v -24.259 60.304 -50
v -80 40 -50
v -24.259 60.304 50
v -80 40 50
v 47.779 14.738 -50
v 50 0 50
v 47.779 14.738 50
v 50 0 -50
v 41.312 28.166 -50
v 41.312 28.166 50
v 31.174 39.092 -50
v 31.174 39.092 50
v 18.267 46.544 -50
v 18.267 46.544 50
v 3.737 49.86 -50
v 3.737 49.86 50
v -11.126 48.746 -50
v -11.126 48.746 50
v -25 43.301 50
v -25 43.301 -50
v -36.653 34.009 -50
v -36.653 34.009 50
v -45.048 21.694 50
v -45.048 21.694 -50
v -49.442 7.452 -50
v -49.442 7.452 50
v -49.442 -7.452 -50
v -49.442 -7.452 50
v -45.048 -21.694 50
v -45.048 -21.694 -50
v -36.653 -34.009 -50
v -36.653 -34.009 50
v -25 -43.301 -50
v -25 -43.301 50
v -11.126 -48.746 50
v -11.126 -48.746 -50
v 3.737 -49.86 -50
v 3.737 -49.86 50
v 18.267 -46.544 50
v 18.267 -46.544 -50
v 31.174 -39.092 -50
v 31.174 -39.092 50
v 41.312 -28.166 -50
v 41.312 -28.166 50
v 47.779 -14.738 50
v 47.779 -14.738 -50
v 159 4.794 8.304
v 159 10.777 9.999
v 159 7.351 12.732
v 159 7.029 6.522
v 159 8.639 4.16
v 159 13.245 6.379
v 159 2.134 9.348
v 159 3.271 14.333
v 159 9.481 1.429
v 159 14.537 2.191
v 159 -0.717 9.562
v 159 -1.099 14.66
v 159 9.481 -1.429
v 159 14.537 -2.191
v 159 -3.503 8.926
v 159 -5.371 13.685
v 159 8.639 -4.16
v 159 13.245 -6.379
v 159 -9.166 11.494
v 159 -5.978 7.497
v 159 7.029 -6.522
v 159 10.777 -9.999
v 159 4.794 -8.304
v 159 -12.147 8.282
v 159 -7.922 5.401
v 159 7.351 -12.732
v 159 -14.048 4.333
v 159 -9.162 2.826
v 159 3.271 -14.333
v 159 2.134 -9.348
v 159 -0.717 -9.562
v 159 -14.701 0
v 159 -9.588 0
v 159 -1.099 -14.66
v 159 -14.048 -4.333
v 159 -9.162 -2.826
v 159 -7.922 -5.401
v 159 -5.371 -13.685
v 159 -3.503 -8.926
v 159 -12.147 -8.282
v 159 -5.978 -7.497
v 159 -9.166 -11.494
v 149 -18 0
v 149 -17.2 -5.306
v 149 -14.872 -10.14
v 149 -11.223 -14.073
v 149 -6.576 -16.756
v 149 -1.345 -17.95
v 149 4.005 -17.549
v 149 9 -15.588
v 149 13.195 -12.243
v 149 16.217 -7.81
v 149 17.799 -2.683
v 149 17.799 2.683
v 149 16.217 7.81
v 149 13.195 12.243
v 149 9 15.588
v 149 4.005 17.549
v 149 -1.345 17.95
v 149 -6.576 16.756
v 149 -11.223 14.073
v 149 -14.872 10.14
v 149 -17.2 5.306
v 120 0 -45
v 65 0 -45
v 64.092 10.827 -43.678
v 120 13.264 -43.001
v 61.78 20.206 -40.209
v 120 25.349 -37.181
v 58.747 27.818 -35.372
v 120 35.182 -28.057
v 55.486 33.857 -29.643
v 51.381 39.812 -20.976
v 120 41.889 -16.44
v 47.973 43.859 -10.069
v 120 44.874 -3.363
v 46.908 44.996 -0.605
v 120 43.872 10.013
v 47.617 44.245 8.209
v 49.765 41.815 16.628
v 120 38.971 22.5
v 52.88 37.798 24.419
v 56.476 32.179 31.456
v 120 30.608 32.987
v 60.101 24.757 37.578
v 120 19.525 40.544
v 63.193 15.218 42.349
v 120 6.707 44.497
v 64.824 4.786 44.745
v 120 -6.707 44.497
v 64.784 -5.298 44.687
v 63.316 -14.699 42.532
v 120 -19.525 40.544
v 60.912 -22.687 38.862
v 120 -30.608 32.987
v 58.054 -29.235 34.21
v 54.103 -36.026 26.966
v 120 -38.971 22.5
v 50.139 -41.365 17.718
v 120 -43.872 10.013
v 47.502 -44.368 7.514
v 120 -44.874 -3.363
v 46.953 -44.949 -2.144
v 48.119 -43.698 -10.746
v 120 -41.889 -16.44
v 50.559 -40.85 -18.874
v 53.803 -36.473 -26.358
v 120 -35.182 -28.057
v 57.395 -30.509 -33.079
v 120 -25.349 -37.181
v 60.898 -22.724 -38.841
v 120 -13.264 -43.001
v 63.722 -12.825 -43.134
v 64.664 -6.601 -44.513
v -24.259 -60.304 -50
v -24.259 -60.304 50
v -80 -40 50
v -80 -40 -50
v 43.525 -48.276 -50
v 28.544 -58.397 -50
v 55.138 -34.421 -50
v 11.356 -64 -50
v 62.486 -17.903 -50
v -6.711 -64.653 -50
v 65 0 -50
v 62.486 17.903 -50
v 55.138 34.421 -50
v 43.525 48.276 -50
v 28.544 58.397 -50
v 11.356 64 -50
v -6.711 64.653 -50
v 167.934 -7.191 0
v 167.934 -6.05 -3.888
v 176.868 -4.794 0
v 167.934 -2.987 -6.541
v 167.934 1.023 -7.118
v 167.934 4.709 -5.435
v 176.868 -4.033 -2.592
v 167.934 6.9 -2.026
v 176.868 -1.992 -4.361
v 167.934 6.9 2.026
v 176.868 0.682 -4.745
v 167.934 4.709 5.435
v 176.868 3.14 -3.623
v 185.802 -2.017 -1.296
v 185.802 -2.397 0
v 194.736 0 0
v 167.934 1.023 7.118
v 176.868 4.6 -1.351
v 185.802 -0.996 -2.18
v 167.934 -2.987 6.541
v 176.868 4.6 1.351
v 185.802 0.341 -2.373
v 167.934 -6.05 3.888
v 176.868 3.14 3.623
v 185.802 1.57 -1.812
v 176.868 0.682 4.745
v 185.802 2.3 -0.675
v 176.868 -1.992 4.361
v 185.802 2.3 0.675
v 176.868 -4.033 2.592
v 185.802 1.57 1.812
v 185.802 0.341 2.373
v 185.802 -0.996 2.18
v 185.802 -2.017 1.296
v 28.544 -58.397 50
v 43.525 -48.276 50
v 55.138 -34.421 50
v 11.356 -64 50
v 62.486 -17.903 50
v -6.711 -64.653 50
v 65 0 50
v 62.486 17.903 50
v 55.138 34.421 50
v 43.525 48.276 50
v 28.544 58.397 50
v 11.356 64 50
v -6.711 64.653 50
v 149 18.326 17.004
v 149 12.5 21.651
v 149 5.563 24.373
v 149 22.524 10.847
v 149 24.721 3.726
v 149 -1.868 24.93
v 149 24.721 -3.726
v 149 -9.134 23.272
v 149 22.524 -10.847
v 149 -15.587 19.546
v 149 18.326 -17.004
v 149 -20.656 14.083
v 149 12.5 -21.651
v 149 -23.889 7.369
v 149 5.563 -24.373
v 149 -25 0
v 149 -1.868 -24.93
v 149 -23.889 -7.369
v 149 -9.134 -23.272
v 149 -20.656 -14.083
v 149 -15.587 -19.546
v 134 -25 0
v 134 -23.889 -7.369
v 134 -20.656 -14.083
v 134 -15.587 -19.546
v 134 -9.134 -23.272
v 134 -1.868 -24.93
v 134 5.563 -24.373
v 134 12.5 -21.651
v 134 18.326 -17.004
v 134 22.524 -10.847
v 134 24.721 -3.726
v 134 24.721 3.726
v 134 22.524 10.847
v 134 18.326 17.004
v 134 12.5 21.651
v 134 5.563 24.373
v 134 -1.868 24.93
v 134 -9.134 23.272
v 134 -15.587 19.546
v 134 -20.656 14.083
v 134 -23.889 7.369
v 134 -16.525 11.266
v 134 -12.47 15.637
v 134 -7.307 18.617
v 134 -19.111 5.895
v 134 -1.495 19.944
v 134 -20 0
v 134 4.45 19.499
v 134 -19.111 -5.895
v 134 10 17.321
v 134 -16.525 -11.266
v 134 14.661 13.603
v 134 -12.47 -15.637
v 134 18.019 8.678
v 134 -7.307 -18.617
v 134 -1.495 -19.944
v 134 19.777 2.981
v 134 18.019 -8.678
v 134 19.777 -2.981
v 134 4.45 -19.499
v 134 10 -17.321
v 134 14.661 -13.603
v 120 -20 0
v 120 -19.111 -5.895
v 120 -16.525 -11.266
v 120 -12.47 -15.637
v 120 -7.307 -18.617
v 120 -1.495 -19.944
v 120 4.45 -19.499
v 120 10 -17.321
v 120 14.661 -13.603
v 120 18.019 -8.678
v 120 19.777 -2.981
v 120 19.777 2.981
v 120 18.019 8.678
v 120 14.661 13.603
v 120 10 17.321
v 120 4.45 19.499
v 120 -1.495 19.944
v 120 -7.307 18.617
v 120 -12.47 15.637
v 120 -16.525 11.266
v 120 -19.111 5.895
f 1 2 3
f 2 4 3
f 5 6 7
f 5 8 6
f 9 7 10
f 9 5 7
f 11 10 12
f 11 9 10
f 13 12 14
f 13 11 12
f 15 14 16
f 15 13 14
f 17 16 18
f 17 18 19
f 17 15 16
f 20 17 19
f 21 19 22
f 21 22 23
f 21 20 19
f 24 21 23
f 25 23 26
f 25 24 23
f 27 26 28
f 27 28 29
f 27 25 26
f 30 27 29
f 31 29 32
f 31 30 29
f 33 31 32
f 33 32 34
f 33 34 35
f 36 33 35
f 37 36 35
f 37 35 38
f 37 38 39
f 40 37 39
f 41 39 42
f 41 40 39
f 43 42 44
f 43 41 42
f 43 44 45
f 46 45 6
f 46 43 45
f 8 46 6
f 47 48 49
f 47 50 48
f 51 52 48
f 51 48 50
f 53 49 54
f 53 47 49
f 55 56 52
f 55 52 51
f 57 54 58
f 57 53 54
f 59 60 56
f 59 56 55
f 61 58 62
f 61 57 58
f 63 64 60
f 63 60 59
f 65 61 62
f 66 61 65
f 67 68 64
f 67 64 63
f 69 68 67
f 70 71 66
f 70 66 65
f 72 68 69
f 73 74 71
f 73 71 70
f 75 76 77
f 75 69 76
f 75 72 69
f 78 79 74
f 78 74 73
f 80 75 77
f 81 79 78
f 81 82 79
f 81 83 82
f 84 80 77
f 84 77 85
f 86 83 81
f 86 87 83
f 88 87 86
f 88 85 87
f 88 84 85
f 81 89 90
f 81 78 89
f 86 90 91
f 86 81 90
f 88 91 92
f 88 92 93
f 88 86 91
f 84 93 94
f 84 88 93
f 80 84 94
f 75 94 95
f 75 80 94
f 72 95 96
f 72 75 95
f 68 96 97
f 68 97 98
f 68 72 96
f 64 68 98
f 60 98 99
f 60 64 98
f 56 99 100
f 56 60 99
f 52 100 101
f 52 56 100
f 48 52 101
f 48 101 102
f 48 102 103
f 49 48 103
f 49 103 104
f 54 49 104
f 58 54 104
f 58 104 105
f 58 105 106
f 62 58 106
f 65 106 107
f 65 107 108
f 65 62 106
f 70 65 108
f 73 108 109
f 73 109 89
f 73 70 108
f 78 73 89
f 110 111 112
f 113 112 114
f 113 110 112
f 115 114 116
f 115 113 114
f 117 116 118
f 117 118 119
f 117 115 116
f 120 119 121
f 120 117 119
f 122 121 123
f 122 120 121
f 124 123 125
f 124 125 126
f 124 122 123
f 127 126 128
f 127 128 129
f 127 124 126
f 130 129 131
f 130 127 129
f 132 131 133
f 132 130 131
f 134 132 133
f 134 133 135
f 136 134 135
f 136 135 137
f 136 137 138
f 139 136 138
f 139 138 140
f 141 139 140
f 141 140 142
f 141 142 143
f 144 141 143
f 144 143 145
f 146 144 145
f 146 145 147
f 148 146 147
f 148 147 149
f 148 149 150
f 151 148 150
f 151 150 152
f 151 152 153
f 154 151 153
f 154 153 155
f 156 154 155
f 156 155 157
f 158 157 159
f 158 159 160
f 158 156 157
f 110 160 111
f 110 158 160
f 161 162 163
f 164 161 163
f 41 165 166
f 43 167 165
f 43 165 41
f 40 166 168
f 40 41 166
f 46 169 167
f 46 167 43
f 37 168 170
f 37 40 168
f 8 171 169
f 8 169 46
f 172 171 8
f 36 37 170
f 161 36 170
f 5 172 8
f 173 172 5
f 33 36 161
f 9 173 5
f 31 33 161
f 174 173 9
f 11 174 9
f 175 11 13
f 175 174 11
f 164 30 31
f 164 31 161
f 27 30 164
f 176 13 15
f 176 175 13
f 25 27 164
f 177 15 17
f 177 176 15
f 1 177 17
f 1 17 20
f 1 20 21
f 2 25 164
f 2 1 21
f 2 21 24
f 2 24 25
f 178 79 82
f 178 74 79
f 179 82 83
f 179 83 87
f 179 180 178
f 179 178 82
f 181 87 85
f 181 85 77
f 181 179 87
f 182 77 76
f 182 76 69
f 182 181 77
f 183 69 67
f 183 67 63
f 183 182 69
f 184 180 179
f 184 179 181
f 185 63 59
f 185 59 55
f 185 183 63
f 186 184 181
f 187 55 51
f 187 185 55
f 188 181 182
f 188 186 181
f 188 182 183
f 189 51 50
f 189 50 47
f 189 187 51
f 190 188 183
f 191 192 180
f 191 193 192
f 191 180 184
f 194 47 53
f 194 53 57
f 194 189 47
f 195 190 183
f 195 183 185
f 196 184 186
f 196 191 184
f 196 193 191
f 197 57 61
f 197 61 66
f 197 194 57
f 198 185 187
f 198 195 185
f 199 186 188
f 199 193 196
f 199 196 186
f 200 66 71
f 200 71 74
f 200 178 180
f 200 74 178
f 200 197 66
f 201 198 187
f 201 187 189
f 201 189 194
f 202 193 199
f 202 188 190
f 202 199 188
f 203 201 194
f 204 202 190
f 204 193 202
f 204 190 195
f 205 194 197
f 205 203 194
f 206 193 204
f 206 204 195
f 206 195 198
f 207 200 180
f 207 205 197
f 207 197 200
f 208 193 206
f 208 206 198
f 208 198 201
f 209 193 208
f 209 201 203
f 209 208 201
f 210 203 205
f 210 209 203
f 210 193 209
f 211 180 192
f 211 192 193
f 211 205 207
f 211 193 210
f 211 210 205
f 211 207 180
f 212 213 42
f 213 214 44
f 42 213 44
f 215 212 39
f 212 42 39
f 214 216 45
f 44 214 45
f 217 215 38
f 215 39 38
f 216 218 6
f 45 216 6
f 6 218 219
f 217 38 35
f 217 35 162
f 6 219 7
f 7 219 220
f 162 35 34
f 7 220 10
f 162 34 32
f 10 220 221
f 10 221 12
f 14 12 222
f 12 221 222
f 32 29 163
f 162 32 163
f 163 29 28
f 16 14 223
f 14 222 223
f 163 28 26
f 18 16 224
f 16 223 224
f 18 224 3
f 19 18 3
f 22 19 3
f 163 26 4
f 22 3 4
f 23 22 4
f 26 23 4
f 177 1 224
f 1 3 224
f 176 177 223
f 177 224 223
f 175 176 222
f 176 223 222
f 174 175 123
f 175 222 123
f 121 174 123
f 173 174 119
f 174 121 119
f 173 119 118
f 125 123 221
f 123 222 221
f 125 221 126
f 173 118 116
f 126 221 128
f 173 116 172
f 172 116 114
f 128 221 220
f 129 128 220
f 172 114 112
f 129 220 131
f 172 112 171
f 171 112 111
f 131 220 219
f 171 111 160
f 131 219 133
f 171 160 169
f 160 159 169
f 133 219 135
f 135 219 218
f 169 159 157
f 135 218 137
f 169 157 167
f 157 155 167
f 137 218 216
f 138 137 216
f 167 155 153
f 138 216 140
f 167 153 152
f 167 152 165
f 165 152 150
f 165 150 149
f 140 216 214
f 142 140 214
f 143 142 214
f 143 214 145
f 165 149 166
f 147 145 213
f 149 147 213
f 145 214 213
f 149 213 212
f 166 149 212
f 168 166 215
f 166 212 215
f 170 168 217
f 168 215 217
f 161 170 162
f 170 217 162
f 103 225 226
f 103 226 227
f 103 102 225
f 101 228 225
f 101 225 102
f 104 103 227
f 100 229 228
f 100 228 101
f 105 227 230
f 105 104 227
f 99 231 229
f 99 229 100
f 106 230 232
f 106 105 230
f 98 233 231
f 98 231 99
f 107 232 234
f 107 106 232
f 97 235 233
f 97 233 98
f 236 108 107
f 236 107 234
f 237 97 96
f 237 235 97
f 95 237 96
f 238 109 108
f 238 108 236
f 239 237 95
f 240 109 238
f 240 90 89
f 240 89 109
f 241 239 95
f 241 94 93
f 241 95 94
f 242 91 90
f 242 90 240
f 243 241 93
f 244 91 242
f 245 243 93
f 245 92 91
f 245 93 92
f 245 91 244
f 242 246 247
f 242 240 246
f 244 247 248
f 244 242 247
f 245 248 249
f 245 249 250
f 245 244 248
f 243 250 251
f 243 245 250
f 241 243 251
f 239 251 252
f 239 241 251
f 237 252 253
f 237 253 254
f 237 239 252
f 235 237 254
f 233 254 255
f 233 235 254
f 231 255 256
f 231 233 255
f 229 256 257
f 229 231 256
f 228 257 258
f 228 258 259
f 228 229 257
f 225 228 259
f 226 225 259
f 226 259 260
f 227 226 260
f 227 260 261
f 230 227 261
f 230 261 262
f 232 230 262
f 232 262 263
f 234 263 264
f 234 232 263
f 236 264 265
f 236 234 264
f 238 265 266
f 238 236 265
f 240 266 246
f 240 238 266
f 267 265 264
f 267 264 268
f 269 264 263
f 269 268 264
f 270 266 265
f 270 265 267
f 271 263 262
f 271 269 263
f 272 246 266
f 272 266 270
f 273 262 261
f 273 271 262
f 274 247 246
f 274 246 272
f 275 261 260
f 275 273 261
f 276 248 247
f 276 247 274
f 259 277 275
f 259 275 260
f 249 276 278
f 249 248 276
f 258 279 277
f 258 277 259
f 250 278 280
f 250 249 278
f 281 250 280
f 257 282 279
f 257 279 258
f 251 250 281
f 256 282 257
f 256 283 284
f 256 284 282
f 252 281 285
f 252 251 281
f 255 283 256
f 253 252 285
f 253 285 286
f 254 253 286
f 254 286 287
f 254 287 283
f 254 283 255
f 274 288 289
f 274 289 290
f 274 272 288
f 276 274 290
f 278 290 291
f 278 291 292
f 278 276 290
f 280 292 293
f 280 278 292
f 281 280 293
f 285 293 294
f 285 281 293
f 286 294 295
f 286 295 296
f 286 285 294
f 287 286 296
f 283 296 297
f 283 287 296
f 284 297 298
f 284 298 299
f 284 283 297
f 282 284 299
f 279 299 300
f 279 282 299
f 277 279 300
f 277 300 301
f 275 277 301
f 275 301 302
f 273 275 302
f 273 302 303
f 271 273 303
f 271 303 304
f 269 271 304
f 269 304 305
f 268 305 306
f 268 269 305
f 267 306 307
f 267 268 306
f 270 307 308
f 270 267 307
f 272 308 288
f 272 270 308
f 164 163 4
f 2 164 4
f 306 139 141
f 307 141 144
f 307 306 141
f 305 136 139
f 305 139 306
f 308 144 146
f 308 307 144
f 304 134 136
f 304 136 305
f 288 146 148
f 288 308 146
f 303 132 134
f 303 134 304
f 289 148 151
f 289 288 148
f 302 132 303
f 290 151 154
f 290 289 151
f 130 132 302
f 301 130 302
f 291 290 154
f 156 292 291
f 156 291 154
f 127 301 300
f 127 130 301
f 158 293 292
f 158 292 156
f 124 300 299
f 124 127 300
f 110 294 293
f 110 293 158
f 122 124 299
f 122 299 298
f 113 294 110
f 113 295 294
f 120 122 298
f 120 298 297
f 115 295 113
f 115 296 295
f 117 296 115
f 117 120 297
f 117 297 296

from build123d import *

# Parameters (mm, degrees)
SKETCH1_R           = 50
BOSS_EXTRUDE1_DEPTH = 50
BOSS_EXTRUDE2_REACH = 202
SKETCH2_R           = 45


with BuildPart() as part:
    # Sketch1 → Boss-Extrude1 (new body, symmetric)
    with BuildSketch(Plane.XY):
        with BuildLine():
            Line((-80, -40), (-80, 40))
            Line((-80, 40), (-24.258721248, 60.303519329))
            ThreePointArc((-24.258721248, 60.303519329), (65, 0), (-24.258721248, -60.303519329))
            Line((-24.258721248, -60.303519329), (-80, -40))
        make_face()
        Circle(SKETCH1_R, mode=Mode.SUBTRACT)
    extrude(amount=BOSS_EXTRUDE1_DEPTH, both=True)

    # Sketch2 → Boss-Extrude2 (add, up to next)
    with BuildSketch(Plane(origin=(120, 0, 0), x_dir=(0, 0, -1), z_dir=(1, 0, 0)), mode=Mode.PRIVATE) as boss_extrude2_sk1:
        Circle(SKETCH2_R)
    boss_extrude2_tool1 = extrude(boss_extrude2_sk1.sketch, amount=-BOSS_EXTRUDE2_REACH, mode=Mode.PRIVATE) - part.part
    add(boss_extrude2_tool1.solids().sort_by_distance((120, 0, 0))[0])

    # Sketch3 → Revolve1 (revolve)
    with BuildSketch(Plane.XY):
        Polygon((120, 0), (120, -20), (134, -20), (134, -25), (149, -25), (149, -18), (159, -14.701335797), (159, -9.588406282), (194.736010759, 0), align=None)
    revolve(axis=Axis((0, 0, 0), (1, 0, 0)))


solid = part.part
